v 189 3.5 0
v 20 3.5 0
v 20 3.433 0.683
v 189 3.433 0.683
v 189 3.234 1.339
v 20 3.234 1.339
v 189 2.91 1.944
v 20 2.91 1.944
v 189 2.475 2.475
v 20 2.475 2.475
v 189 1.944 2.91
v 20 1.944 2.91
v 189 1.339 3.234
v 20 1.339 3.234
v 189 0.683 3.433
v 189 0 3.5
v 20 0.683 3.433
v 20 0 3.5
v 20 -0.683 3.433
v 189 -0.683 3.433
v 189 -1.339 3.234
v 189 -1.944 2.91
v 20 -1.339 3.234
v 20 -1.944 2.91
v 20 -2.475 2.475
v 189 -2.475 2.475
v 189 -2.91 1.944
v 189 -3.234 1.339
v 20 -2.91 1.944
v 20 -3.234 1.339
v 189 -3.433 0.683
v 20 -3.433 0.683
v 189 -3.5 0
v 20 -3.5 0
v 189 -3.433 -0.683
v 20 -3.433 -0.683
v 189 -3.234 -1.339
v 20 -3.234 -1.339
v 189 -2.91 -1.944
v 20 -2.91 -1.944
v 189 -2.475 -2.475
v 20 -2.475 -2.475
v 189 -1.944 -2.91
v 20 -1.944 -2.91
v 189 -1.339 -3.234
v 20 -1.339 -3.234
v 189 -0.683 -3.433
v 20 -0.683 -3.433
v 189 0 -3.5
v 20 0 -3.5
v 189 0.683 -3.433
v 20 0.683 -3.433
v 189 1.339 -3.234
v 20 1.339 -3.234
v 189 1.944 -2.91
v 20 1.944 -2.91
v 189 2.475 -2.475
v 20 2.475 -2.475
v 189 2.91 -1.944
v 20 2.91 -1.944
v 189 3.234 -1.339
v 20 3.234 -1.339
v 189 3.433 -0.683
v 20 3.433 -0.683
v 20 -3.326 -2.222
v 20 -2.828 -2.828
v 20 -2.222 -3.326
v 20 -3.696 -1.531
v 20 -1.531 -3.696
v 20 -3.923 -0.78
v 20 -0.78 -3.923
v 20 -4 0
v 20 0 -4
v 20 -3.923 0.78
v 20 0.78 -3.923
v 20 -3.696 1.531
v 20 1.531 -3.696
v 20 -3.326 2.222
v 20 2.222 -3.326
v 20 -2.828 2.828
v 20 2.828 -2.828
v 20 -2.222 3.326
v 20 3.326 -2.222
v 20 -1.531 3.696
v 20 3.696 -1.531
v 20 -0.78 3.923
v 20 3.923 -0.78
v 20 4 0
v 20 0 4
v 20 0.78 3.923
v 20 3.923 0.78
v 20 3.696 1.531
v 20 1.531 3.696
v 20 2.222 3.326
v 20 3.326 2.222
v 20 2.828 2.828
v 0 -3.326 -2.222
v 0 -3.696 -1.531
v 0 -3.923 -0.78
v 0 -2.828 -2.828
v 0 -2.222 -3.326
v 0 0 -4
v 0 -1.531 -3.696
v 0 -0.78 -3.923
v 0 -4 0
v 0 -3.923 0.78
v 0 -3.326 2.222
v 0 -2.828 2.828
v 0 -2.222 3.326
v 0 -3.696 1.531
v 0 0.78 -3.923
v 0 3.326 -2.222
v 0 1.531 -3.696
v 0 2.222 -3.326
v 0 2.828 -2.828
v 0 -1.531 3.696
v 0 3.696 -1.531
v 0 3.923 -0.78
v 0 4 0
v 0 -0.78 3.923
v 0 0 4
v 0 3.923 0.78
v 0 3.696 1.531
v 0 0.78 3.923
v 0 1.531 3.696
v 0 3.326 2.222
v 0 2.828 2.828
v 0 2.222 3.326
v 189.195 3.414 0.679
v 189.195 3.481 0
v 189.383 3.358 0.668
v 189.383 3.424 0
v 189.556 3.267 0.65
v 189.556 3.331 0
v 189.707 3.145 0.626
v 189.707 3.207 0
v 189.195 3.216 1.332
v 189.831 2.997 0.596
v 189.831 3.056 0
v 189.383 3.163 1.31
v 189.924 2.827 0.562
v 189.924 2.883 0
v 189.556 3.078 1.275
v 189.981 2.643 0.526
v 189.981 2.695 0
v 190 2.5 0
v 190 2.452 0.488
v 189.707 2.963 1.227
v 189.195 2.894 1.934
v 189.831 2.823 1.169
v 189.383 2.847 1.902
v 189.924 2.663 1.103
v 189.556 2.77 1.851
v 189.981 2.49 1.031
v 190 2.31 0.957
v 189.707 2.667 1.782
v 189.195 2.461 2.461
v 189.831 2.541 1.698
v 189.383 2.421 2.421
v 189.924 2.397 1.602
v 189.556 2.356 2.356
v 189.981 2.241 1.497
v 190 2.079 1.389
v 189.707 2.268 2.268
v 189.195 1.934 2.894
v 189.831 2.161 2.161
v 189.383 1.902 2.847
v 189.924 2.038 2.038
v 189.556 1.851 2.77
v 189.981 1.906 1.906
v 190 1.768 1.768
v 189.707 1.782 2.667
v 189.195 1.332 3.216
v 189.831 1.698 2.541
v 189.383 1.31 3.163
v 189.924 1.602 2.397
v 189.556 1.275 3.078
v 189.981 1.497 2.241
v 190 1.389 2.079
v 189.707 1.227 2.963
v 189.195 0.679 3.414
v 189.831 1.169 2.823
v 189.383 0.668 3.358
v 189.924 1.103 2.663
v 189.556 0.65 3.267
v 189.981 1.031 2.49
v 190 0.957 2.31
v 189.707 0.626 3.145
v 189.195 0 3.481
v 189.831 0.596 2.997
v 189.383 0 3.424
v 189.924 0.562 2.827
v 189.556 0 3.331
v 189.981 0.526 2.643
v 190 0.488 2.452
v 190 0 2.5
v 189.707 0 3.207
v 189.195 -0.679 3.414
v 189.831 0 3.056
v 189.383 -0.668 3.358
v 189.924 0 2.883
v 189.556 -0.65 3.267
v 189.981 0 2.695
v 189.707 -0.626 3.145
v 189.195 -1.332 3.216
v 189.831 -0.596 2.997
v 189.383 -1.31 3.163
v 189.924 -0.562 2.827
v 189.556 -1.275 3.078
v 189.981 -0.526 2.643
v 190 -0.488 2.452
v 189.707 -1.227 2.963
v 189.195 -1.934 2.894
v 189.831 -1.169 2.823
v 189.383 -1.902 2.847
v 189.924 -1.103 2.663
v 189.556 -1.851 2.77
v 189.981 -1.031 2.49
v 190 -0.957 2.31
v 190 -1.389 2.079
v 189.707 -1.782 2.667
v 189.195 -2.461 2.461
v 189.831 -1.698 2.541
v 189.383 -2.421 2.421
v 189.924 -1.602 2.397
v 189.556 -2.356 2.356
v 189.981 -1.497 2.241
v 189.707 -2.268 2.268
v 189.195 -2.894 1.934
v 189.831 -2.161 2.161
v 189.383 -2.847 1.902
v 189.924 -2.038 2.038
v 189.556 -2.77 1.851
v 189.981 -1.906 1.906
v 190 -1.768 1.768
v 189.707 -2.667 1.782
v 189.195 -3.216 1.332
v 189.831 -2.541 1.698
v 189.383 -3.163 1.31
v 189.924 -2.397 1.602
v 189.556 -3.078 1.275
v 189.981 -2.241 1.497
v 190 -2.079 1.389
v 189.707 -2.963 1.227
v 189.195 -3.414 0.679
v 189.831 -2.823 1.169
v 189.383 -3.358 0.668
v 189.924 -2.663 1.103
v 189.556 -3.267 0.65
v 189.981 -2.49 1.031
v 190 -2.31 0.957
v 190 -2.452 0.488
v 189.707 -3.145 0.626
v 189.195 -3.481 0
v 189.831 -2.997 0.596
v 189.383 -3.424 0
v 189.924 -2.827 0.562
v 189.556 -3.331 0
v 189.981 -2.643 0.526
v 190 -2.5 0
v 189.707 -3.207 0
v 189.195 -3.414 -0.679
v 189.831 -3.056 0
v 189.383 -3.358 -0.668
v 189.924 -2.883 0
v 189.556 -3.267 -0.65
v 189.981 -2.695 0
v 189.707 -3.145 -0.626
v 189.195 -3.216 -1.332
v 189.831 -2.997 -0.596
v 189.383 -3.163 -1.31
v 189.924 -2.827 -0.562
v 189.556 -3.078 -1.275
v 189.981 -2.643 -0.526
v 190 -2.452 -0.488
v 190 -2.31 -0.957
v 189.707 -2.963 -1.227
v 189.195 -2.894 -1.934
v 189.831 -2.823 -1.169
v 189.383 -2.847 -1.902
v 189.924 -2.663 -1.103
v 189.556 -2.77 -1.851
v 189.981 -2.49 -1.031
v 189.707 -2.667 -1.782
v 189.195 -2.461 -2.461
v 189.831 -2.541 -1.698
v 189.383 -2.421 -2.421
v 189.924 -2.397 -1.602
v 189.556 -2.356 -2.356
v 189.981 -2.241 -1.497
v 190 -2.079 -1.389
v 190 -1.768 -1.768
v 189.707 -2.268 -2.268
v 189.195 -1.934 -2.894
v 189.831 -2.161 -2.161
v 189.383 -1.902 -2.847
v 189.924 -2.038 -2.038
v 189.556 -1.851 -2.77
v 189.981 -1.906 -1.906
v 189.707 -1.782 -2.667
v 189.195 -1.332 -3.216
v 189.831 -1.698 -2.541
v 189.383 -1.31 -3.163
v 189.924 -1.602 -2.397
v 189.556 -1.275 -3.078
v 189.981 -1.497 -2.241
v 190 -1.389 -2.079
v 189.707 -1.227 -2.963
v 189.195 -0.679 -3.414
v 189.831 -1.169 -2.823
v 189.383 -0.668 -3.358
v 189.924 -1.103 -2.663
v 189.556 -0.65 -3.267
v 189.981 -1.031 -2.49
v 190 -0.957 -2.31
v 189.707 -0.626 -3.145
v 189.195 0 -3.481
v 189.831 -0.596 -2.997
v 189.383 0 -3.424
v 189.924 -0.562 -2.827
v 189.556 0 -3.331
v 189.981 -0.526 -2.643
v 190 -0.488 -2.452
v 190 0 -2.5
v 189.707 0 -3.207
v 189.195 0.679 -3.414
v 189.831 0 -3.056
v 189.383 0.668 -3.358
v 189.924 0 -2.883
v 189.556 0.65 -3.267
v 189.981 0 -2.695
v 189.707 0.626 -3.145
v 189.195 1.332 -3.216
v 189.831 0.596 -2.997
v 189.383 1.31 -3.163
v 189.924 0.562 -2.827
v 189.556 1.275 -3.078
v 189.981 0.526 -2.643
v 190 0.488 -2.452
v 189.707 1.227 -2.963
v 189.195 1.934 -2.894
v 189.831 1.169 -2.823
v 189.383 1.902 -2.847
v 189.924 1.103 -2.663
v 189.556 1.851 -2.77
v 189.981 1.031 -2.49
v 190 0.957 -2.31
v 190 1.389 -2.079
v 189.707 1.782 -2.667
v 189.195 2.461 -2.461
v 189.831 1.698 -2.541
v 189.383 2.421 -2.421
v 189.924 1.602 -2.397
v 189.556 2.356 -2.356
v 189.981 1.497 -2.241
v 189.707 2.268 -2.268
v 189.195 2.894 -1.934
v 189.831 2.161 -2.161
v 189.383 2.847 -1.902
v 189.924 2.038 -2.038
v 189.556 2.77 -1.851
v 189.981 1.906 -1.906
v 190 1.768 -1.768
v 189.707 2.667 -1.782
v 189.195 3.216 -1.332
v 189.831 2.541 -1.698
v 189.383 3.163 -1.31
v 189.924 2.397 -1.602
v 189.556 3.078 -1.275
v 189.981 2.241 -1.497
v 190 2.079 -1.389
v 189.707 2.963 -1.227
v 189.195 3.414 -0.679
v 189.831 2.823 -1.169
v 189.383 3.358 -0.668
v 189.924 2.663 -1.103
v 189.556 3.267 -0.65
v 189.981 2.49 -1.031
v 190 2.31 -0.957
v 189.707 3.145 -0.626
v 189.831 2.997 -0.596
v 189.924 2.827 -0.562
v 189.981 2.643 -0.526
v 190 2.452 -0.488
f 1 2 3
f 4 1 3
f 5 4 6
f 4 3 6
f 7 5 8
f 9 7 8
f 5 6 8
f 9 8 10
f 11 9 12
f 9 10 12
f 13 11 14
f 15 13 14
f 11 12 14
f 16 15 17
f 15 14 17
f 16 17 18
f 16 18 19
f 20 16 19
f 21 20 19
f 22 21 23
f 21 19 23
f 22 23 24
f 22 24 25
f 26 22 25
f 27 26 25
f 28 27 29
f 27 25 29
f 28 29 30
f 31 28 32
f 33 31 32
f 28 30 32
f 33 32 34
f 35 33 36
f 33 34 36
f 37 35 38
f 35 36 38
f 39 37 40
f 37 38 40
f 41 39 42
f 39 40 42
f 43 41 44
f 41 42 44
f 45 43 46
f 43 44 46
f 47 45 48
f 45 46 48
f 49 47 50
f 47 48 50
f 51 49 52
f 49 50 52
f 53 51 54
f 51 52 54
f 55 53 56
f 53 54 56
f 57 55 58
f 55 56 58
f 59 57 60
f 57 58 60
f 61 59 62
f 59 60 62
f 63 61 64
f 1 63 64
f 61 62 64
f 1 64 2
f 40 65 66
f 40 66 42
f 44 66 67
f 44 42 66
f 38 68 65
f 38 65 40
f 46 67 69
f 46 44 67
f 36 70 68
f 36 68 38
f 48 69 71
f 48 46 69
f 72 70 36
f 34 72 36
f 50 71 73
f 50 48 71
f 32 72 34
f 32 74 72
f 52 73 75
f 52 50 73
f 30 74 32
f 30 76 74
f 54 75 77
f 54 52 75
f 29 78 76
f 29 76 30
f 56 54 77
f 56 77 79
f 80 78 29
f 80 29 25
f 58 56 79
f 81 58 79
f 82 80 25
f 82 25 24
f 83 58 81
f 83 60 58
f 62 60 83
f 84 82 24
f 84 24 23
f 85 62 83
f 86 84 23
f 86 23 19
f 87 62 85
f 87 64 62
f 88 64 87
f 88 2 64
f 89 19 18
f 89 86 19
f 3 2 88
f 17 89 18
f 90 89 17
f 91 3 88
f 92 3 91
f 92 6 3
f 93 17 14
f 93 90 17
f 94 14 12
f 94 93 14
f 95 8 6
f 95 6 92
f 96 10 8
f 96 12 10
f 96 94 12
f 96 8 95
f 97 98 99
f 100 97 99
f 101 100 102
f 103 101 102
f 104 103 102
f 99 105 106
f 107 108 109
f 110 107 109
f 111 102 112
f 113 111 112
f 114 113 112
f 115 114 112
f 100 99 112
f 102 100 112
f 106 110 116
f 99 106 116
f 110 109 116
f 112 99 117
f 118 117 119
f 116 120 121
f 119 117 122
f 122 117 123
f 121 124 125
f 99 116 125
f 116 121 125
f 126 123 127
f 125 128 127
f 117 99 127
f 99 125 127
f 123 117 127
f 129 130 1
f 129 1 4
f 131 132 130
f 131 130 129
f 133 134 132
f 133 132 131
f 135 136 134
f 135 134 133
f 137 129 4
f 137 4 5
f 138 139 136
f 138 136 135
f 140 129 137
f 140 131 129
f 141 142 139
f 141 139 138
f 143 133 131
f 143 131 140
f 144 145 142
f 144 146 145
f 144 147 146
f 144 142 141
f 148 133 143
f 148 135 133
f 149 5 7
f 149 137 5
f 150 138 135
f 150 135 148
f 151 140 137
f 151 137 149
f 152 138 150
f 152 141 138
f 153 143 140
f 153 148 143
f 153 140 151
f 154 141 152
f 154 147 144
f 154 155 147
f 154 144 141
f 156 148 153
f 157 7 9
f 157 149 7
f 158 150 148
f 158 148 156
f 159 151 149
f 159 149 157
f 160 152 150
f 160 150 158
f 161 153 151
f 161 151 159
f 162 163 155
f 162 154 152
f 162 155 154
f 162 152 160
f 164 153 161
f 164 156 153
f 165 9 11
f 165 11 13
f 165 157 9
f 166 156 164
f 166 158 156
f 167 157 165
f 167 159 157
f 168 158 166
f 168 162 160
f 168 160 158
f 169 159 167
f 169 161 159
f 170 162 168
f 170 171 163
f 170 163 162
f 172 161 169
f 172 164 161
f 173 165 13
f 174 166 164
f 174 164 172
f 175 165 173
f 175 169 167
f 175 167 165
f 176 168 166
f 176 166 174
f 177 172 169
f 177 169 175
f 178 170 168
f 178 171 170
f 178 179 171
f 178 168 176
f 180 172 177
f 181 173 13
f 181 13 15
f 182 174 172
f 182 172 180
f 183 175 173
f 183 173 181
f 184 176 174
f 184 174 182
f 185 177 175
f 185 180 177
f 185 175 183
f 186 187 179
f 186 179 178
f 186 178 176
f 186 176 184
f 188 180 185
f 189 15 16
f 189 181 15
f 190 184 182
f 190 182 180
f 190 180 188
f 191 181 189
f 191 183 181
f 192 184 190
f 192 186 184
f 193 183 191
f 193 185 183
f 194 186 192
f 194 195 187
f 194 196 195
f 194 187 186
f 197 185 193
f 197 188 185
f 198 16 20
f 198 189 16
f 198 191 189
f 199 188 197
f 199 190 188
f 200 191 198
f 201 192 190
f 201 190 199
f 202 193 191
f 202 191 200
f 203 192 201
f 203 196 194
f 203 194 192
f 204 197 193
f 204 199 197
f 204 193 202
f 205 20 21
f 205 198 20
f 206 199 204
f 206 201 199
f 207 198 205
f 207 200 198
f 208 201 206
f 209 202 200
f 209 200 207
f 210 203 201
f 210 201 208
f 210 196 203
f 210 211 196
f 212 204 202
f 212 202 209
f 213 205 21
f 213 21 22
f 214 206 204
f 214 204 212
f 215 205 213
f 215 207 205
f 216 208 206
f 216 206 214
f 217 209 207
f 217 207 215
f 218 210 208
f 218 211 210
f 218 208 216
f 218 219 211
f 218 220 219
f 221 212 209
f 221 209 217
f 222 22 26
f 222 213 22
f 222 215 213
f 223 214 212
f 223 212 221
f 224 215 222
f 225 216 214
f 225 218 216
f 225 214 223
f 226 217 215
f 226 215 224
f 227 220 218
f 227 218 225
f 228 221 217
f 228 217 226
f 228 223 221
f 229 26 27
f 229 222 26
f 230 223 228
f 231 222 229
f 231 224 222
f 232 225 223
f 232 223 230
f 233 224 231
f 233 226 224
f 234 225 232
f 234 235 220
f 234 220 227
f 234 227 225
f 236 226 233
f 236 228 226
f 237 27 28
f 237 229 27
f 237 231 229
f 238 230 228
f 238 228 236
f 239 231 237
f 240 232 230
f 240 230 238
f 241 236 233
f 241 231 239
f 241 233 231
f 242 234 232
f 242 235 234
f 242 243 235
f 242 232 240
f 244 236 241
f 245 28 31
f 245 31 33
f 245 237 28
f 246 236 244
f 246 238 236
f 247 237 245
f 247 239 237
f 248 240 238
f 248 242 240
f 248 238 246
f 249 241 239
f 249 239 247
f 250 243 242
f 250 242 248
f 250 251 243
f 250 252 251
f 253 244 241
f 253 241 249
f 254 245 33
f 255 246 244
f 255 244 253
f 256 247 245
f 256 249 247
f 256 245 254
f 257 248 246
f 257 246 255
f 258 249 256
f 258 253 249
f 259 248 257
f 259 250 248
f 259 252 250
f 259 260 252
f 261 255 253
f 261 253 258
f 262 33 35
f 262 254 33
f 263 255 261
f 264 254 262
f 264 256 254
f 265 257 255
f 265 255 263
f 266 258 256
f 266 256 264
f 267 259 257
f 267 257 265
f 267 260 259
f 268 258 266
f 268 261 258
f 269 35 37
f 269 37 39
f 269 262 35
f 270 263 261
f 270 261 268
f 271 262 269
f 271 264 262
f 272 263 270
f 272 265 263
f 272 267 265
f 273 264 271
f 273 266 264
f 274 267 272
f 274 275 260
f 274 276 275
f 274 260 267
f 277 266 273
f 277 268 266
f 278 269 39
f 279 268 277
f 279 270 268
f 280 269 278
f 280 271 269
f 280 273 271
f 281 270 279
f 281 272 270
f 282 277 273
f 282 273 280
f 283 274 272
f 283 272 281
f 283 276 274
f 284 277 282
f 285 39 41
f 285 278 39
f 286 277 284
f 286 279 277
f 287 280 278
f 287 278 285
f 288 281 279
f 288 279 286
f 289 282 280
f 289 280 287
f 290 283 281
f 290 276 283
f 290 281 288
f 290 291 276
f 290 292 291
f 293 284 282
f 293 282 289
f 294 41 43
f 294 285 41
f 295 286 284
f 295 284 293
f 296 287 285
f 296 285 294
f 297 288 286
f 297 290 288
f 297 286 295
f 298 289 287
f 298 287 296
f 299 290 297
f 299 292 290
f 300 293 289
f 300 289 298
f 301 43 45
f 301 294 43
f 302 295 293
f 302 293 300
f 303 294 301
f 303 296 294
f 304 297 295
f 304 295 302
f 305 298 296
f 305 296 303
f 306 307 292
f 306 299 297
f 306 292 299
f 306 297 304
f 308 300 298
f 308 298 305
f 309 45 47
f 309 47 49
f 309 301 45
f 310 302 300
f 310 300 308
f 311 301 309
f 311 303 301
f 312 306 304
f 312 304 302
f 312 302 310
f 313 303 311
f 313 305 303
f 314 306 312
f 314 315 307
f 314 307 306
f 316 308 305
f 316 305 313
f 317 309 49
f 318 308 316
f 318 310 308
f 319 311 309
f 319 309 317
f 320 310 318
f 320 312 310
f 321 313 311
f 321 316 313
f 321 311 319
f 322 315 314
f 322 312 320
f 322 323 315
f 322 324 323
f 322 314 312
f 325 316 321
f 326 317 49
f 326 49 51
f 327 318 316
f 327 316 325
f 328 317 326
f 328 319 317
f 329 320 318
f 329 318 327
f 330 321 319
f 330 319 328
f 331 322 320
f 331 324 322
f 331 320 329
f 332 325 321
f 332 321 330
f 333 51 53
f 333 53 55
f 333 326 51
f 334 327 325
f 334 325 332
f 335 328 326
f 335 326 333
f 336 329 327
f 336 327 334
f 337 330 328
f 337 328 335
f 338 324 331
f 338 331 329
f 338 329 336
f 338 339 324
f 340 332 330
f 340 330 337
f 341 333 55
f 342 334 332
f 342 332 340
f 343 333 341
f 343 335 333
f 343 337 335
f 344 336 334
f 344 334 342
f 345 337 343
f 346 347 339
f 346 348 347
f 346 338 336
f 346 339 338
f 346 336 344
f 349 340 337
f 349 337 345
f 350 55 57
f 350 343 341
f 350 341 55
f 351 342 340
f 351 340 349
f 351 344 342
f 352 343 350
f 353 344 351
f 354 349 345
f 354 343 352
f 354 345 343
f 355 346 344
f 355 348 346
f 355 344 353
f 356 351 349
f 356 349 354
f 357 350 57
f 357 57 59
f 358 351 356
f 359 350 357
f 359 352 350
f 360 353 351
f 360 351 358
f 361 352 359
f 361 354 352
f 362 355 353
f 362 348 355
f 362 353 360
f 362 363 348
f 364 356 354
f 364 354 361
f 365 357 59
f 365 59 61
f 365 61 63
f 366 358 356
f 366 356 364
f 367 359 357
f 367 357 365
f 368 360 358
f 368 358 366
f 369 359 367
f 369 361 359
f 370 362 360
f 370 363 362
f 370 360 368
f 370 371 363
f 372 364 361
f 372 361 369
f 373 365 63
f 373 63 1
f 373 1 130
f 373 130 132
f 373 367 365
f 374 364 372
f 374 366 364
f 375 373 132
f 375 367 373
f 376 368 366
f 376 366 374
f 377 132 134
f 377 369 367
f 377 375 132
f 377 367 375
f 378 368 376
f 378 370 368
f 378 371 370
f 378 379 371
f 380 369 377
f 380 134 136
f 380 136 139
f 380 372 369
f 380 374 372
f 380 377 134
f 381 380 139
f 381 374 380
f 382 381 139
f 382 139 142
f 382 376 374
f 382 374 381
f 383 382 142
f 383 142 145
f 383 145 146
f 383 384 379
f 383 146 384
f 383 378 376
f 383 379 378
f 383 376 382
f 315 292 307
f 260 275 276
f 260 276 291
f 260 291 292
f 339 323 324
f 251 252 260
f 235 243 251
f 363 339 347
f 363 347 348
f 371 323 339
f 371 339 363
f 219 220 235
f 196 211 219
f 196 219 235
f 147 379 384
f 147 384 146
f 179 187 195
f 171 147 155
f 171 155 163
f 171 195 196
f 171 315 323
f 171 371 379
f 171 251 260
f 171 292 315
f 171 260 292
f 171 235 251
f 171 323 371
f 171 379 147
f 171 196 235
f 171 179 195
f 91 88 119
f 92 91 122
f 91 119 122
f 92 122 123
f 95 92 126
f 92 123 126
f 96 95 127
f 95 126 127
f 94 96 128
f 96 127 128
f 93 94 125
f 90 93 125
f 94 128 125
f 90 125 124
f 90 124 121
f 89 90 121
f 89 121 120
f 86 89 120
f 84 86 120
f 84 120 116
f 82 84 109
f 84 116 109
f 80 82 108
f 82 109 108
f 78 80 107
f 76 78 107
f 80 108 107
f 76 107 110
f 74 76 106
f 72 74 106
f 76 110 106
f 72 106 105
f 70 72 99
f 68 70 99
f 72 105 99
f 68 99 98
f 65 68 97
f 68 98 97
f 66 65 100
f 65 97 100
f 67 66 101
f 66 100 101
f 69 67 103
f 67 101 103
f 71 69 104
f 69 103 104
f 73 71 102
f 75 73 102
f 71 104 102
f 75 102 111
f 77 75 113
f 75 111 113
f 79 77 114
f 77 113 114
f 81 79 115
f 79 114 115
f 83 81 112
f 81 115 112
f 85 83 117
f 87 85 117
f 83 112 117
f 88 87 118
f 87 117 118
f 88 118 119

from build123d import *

# Parameters (mm, degrees)
F0_R     = 4
F1_DEPTH = 20
F2_R     = 3.5
F3_DEPTH = 170
F4_R     = 1


with BuildPart() as f1:
    # F0 (on Right) → F1 (new body)
    with BuildSketch(Plane.YZ):
        Circle(F0_R)
    extrude(amount=F1_DEPTH)

    # F2 (on face) → F3 (join)
    with BuildSketch(Plane.YZ.offset(20)):
        Circle(F2_R)
    extrude(amount=F3_DEPTH)

    # F4
    f4_edges = [f1.edges().sort_by_distance(p)[0] for p in [
        (190, -3.5, 0),
    ]]
    fillet(f4_edges, radius=F4_R)


solid = f1.part
